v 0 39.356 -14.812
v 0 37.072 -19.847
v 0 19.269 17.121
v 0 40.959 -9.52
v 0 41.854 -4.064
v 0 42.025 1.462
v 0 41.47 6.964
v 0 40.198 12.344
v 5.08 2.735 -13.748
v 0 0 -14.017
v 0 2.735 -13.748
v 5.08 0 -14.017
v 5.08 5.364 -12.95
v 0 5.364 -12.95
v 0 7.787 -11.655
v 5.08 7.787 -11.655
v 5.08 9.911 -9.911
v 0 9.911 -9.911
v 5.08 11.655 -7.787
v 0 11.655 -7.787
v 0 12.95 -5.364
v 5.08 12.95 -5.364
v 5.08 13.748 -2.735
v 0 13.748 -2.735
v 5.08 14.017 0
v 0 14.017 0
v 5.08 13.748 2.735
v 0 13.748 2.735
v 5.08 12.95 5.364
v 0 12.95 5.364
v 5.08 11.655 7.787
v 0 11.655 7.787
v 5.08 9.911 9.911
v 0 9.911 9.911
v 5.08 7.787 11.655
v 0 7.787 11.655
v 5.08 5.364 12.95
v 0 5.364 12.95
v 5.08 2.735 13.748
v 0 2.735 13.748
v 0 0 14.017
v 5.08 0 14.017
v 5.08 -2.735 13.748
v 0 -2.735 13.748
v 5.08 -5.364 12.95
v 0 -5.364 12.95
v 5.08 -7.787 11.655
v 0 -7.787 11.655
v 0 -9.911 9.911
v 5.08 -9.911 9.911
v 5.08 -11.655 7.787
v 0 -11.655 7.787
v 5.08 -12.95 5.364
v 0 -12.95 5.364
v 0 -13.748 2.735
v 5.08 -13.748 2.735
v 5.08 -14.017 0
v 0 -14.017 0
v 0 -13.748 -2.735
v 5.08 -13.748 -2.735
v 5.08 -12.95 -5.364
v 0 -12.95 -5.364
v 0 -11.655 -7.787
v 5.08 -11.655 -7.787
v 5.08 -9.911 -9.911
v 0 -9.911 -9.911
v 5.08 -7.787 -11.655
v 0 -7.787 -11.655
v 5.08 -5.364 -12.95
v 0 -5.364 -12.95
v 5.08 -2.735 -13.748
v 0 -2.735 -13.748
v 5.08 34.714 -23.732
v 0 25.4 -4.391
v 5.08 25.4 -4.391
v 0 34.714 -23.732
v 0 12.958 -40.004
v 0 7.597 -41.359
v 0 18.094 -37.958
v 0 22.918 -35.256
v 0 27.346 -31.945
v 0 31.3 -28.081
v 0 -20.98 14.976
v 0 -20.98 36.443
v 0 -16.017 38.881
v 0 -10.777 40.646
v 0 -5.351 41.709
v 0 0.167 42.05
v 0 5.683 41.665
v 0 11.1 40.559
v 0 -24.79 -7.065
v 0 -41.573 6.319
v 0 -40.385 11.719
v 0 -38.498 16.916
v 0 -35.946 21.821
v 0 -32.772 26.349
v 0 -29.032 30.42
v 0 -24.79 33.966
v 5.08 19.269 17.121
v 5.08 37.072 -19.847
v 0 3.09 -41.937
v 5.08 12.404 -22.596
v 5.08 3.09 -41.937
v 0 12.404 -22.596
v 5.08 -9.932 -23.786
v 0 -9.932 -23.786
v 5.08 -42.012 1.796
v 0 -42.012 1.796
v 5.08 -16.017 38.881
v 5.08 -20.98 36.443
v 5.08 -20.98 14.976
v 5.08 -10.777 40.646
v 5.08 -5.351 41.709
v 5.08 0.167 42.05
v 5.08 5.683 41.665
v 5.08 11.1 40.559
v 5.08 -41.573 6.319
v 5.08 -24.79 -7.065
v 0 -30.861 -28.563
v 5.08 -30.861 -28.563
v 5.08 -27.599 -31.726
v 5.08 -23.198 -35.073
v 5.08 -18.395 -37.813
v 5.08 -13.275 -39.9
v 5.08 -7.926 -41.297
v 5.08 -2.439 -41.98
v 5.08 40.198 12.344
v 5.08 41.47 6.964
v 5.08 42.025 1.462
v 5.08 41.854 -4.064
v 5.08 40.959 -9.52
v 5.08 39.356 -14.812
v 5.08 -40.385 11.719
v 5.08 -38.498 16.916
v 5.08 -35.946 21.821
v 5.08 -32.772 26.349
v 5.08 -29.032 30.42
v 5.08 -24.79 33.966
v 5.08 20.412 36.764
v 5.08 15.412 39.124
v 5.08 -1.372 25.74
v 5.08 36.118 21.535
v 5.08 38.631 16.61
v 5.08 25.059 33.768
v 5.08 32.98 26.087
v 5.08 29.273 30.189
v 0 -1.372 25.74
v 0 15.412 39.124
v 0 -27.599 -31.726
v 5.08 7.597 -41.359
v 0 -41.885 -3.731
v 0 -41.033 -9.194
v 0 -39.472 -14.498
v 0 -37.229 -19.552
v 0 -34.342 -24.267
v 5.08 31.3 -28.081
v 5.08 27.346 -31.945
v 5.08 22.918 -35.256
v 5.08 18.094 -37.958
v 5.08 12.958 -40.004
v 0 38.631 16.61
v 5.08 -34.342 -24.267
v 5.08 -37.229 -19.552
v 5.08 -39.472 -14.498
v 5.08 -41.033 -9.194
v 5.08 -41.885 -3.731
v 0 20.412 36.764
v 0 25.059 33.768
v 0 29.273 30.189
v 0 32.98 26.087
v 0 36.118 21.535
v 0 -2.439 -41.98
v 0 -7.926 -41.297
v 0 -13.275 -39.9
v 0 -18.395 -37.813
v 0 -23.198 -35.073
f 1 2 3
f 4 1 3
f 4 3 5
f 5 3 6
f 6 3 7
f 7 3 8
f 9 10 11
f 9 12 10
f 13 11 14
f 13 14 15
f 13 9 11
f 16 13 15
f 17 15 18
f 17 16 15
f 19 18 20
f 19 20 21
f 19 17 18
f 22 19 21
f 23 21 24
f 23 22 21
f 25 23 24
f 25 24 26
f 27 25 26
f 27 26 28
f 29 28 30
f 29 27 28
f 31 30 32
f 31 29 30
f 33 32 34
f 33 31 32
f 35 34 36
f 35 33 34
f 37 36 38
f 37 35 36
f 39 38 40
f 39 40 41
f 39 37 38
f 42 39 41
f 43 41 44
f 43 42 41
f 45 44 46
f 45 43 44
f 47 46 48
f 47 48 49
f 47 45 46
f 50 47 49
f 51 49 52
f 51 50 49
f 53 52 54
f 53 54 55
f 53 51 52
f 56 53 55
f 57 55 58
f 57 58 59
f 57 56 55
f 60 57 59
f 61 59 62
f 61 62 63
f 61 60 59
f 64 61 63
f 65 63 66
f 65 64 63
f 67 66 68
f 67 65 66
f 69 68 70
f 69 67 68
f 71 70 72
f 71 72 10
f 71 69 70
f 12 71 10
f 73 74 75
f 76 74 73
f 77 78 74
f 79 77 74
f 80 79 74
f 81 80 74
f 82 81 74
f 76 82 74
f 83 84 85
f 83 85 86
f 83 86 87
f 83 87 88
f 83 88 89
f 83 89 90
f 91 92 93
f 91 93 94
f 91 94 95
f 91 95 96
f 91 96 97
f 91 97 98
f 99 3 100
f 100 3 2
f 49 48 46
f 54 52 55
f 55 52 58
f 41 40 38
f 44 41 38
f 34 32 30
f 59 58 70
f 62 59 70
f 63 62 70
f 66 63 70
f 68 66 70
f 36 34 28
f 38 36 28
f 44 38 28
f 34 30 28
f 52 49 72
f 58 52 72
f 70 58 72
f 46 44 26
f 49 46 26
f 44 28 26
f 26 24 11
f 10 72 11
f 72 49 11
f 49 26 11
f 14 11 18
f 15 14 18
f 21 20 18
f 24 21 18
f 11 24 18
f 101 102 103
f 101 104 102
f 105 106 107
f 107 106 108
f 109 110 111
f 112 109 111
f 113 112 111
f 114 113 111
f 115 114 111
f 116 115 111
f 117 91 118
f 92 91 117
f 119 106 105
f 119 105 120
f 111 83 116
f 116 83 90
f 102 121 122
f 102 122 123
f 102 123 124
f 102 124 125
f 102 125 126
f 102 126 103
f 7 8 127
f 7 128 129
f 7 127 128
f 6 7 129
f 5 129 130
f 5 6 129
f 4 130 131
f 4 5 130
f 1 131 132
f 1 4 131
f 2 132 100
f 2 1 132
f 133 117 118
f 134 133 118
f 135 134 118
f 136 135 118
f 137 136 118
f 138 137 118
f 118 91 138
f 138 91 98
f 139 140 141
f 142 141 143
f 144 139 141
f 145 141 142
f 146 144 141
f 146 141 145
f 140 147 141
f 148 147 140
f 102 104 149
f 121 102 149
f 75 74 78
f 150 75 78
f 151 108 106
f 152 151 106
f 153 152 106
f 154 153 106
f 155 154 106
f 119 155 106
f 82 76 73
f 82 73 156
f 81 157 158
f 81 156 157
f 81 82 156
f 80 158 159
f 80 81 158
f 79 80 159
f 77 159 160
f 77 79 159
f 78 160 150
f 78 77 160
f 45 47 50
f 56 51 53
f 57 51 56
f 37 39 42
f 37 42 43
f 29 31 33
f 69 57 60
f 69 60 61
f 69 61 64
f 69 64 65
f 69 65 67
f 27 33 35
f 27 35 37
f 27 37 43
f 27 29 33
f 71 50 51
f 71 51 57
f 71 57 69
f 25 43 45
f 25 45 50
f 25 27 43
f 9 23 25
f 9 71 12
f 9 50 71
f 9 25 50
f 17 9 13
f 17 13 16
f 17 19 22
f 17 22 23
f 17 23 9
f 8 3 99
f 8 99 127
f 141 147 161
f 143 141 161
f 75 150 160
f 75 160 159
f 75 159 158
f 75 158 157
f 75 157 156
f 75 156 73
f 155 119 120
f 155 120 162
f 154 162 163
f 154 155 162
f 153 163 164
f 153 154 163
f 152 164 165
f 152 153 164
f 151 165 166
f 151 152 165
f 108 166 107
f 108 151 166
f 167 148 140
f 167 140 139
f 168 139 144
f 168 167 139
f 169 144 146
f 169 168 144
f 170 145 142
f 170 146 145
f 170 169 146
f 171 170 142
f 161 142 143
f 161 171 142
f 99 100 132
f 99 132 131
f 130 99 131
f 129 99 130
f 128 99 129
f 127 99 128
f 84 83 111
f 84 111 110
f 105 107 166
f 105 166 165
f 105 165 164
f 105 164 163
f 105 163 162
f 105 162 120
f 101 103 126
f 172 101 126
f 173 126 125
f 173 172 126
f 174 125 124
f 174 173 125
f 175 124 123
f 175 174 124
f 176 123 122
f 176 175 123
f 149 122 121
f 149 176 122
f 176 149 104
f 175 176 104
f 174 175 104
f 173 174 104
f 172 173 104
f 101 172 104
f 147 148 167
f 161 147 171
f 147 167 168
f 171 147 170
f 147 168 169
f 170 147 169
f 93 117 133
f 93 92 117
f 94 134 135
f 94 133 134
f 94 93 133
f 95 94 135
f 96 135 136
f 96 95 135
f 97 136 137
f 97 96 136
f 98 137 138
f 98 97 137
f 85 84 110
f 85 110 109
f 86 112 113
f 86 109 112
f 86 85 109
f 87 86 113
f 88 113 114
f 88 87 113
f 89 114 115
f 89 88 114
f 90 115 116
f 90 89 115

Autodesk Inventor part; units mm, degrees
ref_plane "YZ Plane" through (0, 0, 0) normal (1, 0, 0) x (0, 1, 0)
ref_plane "XZ Plane" through (0, 0, 0) normal (0, 1, 0) x (-1, 0, 0)
ref_plane "XY Plane" through (0, 0, 0) normal (0, 0, 1) x (1, 0, 0)
sketch "Sketch1" plane through (0, 0, 0) normal (1, 0, 0) x (0, 1, 0)
  circle A0 centre (0, 0) radius 42.0506 construction
  line L0 (0, 0) -> (25.4, 0) construction
  line L1 (25.4, 0) -> (15.8366, -19.8585) construction
  line L2 (15.8366, -19.8585) -> (-5.652, -24.7632) construction
  line L3 (-5.652, -24.7632) -> (-22.8846, -11.0206) construction
  line L4 (-22.8846, -11.0206) -> (-22.8846, 11.0206) construction
  line L5 (-22.8846, 11.0206) -> (-5.652, 24.7632) construction
  line L6 (-5.652, 24.7632) -> (15.8366, 19.8585) construction
  line L7 (15.8366, 19.8585) -> (25.4, 0) construction
  line L8 (-22.8846, -11.0206) -> (-41.8499, 4.1036) construction
  line L9 (-22.8846, 11.0206) -> (-22.8846, 35.2781) construction
  line L10 (-24.7896, -9.5015) -> (-24.7896, 33.9665) construction
  line L11 (-22.8846, -8.5841) -> (-41.573, 6.3194) construction
  line L12 (-24.7896, -7.0649) -> (-24.7896, 33.9665)
  line L13 (-24.7896, -7.0649) -> (-41.573, 6.3194)
  arc A1 (-24.7896, 33.9665) -> (-41.573, 6.3194) centre (0, 0) ccw
  line L14 (-9.9325, -23.7862) -> (-42.0122, 1.7965)
  line L15 (-9.9325, -23.7862) -> (-30.8611, -28.563)
  arc A2 (-42.0122, 1.7965) -> (-30.8611, -28.563) centre (0, 0) ccw
  line L16 (12.4039, -22.596) -> (-27.5987, -31.7263)
  line L17 (12.4039, -22.596) -> (3.0899, -41.9369)
  arc A3 (-27.5987, -31.7263) -> (3.0899, -41.9369) centre (0, 0) ccw
  line L18 (25.4, -4.3906) -> (7.5971, -41.3586)
  line L19 (25.4, -4.3906) -> (34.7141, -23.7315)
  arc A4 (7.5971, -41.3586) -> (34.7141, -23.7315) centre (0, 0) ccw
  line L20 (19.2693, 17.121) -> (37.0722, -19.847)
  line L21 (19.2693, 17.121) -> (40.1979, 12.3442)
  arc A5 (37.0722, -19.847) -> (40.1979, 12.3442) centre (0, 0) ccw
  line L22 (-1.3715, 25.7402) -> (38.6311, 16.6098)
  line L23 (-1.3715, 25.7402) -> (15.4119, 39.1245)
  arc A6 (38.6311, 16.6098) -> (15.4119, 39.1245) centre (0, 0) ccw
  line L24 (-20.9796, 14.9764) -> (11.1, 40.5591)
  line L25 (-20.9796, 14.9764) -> (-20.9796, 36.4432)
  arc A7 (11.1, 40.5591) -> (-20.9796, 36.4432) centre (0, 0) ccw
  dimension "d0" = 25.4
  dimension "d2" = 84.1011
  dimension "d3" = 1.905
  dimension "d4" = 1.905
  dimension "d7" = 360
extrude "Extrusion1" add sketch "Sketch1" along normal blind 5.08
sketch "Sketch2" plane through (5.08, 0, 0) normal (1, 0, 0) x (0, 0, -1)
  circle A0 centre (0, 0) radius 14.0169
  circle A1 centre (0, 0) radius 42.0506 construction
  point P0 (19.847, 37.0722)
  dimension "d11" = 84.1011
  dimension "d12" = 28.0337
extrude "Extrusion2" add sketch "Sketch2" against normal up to surface (5.08 mm away)
equation "\"d2\" = 3.23607 * d0 + d3"
equation "\"d3\" = 0.075 * d0"
equation "\"d4\" = d3"
equation "\"d9\" = 0.2 * d0"
equation "\"d12\" = 0.333333 * d11"
properties part number "aperture"
